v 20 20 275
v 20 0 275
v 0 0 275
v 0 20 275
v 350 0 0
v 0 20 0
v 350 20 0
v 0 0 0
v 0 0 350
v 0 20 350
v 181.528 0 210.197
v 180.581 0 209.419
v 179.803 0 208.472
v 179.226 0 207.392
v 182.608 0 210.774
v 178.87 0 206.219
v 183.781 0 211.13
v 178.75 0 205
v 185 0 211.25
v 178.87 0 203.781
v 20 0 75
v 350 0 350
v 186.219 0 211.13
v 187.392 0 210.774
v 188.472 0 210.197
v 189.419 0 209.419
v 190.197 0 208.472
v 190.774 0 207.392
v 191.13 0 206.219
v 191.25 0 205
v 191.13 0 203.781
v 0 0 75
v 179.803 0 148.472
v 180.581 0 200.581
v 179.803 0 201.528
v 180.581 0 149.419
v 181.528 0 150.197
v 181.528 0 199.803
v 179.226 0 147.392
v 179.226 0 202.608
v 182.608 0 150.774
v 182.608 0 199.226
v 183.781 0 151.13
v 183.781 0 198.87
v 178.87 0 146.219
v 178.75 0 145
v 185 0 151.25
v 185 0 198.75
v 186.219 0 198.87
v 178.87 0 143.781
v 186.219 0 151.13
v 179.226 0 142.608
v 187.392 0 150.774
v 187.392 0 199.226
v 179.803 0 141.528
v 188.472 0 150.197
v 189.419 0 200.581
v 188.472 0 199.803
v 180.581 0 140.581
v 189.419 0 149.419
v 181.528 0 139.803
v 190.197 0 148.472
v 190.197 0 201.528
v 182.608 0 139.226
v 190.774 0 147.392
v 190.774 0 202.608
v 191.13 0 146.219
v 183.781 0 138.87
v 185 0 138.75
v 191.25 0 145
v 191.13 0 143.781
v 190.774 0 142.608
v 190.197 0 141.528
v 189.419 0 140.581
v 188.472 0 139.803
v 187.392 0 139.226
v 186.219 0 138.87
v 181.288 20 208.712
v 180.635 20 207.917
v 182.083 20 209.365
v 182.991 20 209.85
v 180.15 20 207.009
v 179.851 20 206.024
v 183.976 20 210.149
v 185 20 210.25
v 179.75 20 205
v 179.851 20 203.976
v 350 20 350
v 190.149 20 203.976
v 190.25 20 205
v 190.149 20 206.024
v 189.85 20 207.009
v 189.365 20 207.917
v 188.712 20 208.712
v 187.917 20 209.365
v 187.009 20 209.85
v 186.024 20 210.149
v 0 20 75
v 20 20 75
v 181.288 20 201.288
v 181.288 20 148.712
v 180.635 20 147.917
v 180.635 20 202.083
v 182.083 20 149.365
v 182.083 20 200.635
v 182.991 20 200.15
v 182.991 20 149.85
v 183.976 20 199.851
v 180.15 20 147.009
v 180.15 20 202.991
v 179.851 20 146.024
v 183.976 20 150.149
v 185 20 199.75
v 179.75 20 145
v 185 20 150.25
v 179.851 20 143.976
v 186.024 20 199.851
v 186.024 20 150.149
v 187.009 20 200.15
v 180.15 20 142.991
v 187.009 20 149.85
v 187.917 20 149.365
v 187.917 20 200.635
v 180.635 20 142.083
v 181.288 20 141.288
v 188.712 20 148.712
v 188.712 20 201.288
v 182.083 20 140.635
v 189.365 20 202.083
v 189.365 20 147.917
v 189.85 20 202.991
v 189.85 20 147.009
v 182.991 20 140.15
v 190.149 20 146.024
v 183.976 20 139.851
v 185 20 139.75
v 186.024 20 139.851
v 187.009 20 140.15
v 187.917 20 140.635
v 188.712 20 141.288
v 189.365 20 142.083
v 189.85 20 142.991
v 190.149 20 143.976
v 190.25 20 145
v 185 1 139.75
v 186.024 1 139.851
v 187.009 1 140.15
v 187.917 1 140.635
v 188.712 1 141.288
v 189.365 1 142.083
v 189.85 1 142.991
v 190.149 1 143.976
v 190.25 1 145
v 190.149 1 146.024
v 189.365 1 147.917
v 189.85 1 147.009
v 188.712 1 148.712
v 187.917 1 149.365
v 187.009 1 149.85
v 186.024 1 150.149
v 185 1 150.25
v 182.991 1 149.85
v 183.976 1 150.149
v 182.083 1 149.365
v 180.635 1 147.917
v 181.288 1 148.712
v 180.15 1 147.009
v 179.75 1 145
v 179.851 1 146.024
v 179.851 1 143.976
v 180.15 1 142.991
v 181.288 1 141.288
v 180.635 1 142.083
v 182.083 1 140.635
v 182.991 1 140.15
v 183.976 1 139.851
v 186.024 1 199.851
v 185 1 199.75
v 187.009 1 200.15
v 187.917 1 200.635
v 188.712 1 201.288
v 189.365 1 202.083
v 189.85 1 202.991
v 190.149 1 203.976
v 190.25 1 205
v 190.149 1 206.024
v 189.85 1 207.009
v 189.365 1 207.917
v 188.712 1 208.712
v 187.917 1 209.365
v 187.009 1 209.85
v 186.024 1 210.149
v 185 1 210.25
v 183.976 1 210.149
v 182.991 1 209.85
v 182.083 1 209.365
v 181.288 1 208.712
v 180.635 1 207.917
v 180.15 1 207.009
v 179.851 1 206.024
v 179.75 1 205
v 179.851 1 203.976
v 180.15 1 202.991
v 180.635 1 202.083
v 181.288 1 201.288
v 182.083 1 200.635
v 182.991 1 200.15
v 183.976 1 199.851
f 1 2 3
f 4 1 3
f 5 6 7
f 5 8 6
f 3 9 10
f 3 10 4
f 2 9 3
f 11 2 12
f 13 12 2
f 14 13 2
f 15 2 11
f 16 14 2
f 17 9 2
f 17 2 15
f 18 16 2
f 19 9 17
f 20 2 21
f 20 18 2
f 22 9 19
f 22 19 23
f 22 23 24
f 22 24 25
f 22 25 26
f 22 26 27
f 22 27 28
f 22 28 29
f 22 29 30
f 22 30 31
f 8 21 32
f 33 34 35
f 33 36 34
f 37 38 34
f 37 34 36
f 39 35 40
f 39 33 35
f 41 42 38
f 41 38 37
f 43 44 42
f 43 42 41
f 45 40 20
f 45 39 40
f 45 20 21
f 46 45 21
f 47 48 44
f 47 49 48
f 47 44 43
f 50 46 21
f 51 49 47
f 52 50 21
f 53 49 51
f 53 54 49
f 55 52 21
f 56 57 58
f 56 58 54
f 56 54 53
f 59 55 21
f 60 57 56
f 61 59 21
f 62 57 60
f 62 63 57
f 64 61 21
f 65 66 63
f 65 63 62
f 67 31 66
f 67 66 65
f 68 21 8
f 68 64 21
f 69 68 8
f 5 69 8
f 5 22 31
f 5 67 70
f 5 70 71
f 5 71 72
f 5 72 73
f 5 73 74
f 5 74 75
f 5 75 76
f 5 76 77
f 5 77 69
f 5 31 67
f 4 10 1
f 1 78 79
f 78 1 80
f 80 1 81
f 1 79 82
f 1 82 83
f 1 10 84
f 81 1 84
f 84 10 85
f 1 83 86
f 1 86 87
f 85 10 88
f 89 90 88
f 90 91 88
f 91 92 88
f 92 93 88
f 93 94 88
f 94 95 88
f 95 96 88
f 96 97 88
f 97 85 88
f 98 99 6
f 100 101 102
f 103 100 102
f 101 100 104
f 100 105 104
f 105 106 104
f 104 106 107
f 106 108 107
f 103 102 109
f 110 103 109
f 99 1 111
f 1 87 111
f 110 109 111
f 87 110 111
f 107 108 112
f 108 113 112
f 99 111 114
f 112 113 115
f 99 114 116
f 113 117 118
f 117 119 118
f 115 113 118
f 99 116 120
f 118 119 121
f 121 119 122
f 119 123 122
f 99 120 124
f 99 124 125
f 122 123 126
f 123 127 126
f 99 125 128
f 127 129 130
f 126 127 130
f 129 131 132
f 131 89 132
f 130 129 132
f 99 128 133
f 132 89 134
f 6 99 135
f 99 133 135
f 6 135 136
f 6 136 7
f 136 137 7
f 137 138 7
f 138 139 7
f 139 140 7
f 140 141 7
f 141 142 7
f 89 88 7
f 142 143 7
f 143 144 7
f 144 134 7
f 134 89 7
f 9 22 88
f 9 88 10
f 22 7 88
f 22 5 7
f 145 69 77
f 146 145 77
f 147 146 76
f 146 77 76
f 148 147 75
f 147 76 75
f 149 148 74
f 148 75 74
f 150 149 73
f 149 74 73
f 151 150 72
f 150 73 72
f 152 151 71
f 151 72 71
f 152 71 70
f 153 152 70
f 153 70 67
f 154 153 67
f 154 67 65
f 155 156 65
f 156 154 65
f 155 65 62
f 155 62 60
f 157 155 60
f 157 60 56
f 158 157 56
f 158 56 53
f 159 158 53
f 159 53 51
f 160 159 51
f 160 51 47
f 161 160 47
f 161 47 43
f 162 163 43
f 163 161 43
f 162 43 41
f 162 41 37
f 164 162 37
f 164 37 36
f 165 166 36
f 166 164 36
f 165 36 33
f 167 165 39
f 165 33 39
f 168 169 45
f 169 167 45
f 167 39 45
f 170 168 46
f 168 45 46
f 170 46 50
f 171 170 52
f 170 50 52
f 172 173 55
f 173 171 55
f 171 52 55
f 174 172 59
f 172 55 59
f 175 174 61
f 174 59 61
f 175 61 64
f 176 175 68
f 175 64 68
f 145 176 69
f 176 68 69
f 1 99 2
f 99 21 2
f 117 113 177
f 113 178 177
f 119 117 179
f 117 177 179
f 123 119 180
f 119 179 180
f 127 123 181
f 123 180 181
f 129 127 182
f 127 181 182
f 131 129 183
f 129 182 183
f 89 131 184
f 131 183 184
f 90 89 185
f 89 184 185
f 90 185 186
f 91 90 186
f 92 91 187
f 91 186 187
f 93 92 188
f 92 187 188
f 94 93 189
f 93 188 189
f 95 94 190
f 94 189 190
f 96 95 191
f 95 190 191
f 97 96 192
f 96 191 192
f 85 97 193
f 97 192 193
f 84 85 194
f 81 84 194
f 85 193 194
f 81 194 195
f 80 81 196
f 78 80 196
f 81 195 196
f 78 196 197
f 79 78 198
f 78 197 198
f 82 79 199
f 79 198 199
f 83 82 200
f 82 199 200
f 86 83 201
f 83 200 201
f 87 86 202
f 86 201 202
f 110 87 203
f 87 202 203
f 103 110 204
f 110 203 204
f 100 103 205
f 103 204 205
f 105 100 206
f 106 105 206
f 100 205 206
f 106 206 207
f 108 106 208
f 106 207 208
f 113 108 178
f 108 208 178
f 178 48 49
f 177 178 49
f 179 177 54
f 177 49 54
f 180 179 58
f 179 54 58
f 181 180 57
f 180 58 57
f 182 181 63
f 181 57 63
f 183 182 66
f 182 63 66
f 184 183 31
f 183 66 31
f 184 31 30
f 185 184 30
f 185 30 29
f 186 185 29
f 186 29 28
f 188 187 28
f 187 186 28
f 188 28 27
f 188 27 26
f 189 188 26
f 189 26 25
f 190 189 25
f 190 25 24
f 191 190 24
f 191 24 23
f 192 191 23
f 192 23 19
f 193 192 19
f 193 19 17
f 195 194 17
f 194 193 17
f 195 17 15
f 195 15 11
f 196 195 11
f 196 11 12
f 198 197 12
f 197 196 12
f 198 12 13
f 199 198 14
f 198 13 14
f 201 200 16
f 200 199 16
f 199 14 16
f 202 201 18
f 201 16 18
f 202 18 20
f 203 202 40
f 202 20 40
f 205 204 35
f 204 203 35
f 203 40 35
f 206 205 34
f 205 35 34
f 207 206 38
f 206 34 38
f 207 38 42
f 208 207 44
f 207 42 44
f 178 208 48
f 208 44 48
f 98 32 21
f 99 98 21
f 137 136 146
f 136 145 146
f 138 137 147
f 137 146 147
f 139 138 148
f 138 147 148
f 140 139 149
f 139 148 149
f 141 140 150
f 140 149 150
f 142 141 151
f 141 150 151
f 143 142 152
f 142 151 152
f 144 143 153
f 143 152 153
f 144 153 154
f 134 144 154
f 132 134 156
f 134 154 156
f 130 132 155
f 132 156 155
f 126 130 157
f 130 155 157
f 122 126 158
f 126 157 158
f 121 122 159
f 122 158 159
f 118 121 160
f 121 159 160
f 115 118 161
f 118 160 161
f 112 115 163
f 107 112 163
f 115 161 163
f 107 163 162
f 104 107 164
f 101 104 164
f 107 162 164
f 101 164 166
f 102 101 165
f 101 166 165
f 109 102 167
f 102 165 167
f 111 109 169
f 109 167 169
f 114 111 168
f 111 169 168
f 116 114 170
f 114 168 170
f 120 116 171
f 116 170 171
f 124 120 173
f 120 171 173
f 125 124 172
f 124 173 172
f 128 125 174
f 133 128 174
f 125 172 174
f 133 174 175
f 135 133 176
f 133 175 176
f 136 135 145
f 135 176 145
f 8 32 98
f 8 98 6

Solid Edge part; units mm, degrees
sketch "Sketch1" plane through (0, 0, 0) normal (0, -1, 0) x (1, 0, 0)
  line L0 (350, 0) -> (350, 350)
  line L1 (350, 350) -> (0, 350)
  line L2 (0, 350) -> (0, 0)
  line L3 (0, 0) -> (350, 0)
extrude "Protrusion1" add sketch "Sketch1" against normal blind 20
sketch "Sketch2" plane through (250, 0, 250) normal (0, -1, 0) x (0, 0, 1)
  line L0 (-175, 250) -> (-175, 230)
  line L1 (-175, 230) -> (25, 230)
  line L2 (25, 230) -> (25, 250)
  line L3 (25, 250) -> (-175, 250)
  dimension "D1" = 200
  dimension "D2" = 20
  dimension "D3" = 75
extrude "Extrusionsausschnitt_1" cut sketch "Sketch2" against normal blind 67.8542
hole "Bohrung_1" at (185, 0, 205) direction (0, 1, 0) diameter 10.5 end up to next start chamfer 1 start chamfer angle 45
hole "Hole1" at (185, 0, 145) direction (0, 1, 0) diameter 10.5 end up to next start chamfer 1 start chamfer angle 45
